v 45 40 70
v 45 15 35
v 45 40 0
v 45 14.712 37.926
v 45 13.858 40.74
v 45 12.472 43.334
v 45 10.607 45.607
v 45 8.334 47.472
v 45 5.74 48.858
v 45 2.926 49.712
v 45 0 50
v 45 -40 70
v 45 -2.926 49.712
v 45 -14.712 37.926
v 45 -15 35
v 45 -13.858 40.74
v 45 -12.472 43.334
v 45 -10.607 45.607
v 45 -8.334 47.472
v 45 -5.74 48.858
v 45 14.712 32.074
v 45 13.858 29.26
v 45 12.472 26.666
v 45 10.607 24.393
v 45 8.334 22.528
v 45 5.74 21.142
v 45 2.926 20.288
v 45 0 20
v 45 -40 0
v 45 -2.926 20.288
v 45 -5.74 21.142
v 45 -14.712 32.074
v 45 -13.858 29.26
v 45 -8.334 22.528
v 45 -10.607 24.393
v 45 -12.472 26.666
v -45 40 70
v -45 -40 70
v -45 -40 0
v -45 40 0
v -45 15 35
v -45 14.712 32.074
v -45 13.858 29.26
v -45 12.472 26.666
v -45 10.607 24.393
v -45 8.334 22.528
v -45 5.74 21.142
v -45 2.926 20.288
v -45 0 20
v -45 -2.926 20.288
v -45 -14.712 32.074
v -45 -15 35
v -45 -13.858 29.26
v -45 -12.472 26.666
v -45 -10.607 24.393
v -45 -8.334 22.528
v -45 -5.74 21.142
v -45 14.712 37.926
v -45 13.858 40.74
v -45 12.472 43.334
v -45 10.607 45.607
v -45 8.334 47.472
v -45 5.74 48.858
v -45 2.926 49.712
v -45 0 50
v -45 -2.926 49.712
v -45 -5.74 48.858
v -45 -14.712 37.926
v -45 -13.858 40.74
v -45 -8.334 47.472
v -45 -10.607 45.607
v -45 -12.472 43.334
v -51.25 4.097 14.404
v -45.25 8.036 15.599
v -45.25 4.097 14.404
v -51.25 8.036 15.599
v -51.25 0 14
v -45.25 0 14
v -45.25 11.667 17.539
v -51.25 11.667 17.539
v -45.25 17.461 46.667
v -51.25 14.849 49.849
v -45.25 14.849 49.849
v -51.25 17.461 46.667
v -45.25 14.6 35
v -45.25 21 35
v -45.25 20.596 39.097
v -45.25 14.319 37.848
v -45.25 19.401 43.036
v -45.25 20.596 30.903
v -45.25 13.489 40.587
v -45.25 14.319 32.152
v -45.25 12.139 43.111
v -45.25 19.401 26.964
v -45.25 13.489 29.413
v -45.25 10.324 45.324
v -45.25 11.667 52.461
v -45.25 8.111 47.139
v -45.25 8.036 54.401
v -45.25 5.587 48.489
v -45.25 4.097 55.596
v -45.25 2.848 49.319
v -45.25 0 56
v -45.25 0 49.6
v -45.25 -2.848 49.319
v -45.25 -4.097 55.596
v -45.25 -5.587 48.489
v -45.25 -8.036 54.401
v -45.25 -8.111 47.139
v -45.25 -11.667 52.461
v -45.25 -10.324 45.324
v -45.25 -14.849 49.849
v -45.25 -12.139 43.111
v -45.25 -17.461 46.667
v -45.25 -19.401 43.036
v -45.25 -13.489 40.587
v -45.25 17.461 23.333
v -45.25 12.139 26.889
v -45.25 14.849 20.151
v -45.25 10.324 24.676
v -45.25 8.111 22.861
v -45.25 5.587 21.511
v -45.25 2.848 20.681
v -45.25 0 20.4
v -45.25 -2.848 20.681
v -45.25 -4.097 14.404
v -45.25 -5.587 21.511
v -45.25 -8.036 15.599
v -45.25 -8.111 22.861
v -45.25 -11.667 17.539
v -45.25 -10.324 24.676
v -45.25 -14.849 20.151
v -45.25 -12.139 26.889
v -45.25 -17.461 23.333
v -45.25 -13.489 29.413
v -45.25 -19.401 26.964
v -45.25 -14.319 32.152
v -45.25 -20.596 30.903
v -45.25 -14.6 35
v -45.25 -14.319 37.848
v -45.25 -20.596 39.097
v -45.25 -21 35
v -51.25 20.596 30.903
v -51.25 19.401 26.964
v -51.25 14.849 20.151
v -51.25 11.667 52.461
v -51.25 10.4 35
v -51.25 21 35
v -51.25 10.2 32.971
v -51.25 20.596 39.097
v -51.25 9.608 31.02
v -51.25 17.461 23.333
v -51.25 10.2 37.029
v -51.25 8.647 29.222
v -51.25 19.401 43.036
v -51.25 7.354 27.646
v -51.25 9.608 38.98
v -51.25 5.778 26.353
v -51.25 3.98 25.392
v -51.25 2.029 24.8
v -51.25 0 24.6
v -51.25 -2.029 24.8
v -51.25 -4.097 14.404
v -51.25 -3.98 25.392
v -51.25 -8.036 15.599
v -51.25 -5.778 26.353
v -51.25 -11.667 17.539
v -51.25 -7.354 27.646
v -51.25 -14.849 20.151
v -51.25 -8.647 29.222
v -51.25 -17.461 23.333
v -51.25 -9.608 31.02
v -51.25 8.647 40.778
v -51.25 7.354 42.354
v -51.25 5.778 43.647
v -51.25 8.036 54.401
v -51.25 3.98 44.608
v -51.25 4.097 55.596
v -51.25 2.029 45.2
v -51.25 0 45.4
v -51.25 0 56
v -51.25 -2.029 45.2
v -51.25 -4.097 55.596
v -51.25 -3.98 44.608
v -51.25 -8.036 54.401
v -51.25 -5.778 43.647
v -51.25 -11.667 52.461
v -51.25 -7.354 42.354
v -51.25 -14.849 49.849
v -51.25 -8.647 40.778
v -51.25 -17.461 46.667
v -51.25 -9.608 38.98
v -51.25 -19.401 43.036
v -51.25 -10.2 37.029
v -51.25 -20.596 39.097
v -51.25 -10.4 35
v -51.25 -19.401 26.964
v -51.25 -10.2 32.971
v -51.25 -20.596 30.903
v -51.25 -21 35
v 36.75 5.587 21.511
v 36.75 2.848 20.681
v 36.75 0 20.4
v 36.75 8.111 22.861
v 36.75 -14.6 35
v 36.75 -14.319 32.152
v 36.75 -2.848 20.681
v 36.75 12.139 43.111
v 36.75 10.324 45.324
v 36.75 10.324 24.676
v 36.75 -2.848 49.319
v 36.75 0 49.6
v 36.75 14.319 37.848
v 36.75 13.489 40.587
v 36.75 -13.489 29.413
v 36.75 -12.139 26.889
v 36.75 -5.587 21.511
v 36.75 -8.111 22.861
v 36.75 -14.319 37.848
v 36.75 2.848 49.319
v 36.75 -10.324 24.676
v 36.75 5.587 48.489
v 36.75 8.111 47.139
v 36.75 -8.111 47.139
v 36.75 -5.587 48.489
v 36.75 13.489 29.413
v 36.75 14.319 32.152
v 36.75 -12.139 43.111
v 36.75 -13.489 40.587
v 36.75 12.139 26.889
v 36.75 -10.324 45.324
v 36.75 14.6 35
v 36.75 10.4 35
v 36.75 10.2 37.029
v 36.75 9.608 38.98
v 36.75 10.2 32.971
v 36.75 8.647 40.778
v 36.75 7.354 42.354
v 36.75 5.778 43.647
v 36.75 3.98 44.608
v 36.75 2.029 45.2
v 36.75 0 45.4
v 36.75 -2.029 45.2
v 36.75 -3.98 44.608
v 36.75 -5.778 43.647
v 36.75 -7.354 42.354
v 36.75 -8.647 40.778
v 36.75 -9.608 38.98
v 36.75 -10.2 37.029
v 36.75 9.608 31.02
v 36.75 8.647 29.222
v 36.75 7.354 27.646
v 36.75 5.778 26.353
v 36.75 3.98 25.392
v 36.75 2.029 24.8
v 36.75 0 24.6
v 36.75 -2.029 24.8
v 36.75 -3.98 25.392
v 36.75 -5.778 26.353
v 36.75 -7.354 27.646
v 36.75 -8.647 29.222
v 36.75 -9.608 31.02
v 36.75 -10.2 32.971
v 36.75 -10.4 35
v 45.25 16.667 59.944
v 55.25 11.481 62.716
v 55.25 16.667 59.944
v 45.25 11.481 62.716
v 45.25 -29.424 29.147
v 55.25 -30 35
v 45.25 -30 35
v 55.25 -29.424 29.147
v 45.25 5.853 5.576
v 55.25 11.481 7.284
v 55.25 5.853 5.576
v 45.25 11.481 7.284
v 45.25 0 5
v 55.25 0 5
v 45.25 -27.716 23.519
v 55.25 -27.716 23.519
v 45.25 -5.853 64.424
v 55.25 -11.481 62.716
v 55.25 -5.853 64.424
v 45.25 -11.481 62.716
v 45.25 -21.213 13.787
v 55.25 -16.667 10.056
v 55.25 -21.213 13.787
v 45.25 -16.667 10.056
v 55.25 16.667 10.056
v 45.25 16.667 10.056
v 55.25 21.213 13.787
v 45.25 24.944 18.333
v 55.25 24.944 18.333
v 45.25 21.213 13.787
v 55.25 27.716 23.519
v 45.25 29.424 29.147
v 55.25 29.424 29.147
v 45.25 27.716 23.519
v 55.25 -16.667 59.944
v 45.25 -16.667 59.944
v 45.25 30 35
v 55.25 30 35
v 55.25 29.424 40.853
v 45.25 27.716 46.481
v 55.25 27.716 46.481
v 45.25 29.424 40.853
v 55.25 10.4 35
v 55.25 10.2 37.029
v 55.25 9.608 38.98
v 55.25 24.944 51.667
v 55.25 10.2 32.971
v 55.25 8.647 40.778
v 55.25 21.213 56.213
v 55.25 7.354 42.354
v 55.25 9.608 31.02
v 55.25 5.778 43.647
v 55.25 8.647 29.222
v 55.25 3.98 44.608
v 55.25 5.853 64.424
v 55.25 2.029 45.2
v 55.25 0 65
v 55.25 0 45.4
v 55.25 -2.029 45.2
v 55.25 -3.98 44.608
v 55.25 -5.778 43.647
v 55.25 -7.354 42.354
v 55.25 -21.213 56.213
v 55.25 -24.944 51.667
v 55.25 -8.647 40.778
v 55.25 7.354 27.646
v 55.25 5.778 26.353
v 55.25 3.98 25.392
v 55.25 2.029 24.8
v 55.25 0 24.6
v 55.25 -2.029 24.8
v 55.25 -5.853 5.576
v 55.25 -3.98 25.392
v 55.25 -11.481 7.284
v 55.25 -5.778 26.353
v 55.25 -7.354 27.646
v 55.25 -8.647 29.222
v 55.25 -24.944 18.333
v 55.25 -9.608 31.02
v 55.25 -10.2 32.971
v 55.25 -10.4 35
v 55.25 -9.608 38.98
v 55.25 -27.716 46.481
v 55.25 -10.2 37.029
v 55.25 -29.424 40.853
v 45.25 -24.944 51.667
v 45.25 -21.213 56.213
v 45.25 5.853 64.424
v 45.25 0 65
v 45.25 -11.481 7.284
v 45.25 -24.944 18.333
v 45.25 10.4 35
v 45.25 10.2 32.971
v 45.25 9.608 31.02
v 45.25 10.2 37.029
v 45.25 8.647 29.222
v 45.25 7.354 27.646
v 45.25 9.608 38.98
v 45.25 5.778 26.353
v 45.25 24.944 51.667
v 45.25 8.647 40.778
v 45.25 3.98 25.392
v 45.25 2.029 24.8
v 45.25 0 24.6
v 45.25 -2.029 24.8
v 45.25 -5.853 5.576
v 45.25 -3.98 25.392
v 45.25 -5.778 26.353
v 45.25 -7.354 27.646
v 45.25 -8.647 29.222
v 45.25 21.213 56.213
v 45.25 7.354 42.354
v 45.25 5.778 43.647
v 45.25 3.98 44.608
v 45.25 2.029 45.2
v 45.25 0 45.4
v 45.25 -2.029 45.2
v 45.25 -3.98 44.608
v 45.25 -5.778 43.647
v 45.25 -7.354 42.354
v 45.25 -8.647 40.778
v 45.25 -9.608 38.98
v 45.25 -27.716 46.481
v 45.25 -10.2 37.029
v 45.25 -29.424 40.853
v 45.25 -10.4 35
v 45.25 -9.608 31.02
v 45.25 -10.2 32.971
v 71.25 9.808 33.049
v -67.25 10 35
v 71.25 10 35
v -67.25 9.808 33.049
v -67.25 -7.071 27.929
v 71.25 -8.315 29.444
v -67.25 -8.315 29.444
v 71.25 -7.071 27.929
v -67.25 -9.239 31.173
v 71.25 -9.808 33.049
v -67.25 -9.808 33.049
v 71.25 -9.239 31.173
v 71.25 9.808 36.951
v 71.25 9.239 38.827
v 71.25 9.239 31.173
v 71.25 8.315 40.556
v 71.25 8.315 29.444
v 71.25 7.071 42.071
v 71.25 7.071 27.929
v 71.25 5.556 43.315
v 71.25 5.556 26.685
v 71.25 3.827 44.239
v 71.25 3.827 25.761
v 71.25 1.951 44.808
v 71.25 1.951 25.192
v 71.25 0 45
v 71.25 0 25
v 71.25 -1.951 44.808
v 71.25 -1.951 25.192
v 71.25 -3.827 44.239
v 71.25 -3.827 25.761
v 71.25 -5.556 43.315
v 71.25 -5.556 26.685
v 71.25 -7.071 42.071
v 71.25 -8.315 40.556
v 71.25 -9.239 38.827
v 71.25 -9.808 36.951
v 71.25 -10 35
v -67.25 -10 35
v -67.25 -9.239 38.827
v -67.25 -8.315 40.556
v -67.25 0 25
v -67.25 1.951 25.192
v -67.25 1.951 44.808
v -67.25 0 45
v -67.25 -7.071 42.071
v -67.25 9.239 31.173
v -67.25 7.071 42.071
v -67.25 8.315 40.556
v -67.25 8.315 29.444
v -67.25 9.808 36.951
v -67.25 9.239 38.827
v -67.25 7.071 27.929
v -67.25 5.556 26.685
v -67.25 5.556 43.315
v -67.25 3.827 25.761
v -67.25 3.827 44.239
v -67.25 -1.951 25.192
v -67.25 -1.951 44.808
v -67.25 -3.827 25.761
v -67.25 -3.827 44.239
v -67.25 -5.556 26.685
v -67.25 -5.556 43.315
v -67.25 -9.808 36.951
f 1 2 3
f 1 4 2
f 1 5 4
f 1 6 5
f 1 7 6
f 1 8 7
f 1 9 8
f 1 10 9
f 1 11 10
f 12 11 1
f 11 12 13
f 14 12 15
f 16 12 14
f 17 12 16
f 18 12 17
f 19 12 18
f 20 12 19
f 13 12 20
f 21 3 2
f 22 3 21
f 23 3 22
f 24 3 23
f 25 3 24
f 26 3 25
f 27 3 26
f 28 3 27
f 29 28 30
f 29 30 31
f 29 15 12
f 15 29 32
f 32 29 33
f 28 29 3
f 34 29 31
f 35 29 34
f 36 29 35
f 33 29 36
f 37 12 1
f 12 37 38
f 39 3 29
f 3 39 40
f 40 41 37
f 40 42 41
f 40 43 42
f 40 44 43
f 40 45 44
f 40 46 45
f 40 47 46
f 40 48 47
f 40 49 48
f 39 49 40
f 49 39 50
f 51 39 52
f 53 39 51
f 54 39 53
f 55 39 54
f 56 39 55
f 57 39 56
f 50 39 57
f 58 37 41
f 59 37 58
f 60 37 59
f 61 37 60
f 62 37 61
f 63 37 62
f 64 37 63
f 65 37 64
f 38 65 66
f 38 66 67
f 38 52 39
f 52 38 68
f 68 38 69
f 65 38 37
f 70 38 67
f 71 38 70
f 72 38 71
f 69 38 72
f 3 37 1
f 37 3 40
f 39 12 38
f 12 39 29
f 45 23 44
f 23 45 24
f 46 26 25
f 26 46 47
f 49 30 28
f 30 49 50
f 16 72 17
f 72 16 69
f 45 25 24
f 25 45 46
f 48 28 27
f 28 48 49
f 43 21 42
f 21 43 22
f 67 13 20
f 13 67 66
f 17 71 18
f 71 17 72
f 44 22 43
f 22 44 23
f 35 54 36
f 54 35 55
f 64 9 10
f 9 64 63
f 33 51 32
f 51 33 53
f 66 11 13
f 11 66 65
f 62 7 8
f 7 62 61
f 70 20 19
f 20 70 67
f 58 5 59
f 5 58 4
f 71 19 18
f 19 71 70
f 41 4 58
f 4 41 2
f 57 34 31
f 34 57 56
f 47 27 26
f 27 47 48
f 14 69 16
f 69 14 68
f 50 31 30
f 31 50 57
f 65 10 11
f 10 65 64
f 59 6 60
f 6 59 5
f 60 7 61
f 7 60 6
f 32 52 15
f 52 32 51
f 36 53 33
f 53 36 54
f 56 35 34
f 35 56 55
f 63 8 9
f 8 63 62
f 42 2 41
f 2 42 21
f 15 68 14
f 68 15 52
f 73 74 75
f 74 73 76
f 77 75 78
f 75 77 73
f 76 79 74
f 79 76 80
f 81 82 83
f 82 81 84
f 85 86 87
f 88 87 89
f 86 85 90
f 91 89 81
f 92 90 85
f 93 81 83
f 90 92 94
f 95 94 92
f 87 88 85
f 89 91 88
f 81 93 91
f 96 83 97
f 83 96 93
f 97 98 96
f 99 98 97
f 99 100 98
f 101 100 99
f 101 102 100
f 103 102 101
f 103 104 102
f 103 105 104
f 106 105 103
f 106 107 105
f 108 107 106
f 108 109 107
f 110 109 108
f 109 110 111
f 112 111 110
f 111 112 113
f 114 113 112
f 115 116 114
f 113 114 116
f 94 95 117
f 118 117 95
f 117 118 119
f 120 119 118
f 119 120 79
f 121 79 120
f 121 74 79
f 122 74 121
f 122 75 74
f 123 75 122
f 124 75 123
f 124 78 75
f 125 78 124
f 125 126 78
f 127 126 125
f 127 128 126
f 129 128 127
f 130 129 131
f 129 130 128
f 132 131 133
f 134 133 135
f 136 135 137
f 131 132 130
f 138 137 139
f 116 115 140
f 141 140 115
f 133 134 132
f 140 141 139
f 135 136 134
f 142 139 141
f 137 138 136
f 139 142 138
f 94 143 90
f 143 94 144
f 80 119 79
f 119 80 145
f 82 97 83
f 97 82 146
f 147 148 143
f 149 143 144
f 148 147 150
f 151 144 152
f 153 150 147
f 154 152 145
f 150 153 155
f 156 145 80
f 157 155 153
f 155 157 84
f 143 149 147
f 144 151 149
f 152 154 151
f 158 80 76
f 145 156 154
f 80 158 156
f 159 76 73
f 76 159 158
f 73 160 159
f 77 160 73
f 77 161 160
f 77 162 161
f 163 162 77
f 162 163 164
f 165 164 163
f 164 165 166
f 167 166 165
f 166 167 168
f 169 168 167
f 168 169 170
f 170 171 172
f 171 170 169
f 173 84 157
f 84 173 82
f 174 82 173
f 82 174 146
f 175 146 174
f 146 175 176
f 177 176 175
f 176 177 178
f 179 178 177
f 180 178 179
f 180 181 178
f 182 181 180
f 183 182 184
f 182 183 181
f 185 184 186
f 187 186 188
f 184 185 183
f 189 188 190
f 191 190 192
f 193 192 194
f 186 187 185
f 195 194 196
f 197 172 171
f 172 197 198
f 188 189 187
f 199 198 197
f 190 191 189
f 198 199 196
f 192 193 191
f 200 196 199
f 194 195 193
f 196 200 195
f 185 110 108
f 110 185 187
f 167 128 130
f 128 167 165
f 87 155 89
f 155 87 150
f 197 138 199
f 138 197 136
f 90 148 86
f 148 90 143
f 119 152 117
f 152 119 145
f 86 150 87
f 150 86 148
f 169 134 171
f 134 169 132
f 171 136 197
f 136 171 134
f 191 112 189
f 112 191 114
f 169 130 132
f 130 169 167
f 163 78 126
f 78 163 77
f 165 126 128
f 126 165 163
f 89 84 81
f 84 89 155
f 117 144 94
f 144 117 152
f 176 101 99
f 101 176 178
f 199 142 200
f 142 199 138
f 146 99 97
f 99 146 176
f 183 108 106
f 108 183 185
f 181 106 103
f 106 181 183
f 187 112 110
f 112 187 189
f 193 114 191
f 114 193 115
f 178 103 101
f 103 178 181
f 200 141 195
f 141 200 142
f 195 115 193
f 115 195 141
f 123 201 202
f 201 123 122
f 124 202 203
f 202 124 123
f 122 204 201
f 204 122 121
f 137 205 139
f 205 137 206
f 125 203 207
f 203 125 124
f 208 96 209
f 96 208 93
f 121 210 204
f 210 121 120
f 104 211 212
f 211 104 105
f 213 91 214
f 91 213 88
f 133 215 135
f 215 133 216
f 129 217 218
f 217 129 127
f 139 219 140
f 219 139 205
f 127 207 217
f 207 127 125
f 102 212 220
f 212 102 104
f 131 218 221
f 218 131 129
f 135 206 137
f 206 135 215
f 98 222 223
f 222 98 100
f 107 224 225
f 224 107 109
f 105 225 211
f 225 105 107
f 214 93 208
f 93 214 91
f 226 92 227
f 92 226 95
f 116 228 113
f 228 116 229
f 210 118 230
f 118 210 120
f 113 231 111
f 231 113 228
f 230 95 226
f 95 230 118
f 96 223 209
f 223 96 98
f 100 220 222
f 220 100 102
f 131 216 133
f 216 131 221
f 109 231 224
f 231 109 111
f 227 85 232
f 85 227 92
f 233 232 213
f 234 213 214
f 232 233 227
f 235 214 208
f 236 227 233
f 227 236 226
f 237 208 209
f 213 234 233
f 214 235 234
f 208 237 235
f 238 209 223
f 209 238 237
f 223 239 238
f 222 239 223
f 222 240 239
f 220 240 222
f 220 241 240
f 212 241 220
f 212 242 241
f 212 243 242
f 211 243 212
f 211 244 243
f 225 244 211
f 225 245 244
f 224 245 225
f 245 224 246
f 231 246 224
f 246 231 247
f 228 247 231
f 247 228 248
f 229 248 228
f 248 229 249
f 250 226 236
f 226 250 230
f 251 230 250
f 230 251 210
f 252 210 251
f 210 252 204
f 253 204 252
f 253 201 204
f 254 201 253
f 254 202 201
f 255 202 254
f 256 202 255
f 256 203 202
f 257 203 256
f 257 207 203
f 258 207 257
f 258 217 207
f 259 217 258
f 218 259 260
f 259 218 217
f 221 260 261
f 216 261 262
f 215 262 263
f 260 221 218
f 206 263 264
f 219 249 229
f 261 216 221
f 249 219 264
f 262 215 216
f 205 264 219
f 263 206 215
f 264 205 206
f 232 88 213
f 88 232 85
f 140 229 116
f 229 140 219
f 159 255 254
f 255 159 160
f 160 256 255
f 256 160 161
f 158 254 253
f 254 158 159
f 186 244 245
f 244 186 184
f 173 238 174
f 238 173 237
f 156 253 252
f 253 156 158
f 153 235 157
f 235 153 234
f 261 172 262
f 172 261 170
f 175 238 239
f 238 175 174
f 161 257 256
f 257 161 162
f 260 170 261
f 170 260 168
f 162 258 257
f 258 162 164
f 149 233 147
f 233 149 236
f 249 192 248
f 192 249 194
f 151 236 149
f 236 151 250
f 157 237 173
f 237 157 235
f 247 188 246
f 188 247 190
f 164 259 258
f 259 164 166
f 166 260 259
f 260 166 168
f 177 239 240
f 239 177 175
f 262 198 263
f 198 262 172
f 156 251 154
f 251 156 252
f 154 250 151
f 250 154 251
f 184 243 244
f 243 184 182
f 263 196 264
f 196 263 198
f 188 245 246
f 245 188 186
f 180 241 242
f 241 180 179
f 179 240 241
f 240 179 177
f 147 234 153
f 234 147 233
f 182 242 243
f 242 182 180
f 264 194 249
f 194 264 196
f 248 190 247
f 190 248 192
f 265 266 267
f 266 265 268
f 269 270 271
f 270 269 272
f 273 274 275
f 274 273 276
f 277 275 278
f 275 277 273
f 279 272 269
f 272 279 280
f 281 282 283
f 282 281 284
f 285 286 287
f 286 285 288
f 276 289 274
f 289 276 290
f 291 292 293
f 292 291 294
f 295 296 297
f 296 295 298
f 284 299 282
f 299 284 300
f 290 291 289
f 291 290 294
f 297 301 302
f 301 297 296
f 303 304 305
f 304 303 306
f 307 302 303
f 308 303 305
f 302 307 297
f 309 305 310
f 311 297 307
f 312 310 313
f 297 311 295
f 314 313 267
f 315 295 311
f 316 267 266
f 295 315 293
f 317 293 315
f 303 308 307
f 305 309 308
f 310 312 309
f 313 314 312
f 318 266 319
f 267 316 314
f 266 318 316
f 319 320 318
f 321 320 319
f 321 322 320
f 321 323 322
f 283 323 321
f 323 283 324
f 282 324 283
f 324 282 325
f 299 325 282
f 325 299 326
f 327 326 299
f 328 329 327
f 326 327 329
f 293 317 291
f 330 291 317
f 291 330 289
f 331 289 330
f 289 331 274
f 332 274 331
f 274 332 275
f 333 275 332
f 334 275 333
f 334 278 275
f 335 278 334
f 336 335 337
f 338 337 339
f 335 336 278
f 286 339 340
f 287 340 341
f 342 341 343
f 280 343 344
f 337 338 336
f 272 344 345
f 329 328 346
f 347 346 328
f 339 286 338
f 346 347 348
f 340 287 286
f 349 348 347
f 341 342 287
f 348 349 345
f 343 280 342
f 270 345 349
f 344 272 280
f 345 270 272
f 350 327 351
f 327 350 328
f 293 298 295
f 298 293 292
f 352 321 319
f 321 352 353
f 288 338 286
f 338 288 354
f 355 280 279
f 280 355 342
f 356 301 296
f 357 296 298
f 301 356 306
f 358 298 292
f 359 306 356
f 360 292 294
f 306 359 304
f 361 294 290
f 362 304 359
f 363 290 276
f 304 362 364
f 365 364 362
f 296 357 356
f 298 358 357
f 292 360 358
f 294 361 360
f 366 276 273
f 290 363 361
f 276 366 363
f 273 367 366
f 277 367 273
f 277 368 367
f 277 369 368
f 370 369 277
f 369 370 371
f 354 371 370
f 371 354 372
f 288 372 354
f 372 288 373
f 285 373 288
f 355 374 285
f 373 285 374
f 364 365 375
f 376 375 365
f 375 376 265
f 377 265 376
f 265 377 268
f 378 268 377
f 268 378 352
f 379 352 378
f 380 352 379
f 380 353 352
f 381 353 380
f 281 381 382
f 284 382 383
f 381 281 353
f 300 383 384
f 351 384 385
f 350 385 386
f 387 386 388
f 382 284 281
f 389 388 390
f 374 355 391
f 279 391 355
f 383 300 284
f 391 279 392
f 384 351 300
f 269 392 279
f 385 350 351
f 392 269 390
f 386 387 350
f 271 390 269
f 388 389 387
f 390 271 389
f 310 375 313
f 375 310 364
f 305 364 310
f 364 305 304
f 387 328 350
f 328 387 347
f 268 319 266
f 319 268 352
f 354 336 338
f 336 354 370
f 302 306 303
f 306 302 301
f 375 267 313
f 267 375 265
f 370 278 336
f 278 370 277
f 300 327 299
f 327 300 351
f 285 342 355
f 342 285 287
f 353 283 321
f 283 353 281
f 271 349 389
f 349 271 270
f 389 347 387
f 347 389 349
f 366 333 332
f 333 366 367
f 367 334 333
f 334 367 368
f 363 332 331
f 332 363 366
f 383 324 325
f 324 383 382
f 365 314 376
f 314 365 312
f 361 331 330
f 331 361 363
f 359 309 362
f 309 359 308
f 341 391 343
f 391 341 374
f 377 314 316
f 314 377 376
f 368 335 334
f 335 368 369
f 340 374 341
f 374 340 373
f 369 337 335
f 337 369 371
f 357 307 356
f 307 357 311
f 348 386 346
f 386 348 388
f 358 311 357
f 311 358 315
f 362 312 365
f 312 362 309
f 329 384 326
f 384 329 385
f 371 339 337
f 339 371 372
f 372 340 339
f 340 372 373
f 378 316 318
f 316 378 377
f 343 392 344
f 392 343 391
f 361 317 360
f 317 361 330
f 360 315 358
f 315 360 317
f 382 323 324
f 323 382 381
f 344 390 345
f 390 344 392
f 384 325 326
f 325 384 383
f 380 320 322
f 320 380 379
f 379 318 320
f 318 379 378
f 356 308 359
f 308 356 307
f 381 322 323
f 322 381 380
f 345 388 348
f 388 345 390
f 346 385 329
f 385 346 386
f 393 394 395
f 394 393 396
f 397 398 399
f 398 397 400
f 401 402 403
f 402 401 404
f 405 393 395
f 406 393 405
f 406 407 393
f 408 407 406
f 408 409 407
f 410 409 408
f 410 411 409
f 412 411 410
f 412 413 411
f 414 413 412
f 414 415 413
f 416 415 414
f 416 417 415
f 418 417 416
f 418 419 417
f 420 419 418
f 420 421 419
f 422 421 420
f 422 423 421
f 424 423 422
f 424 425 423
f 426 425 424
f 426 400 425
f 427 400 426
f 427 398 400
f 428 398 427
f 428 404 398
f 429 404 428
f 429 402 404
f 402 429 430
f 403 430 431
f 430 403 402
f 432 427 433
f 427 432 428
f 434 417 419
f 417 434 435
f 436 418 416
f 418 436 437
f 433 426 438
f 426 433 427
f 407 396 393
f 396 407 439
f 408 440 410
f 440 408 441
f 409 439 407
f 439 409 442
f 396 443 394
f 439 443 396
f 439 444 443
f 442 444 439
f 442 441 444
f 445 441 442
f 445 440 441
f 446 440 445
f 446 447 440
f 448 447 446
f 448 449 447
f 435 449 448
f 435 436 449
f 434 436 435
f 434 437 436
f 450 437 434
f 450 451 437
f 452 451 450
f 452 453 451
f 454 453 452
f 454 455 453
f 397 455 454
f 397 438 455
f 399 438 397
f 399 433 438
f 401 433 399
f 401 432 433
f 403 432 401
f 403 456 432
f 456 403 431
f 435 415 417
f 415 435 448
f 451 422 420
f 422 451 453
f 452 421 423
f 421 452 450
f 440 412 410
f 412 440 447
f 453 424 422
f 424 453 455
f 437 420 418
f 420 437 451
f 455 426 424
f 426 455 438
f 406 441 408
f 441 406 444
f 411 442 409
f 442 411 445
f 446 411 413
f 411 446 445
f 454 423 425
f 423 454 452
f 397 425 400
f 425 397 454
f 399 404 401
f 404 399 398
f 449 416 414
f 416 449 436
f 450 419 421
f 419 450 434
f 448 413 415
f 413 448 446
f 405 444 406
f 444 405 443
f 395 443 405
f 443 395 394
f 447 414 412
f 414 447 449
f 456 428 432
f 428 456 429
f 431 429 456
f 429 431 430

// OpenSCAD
$fn = 32;

// ------------------------------------------------------------------------
// Bushed housing: 90 x 80 x 70 mm housing, bushing d29.2
// Every part is its own module, assembly() places them once.
// ------------------------------------------------------------------------

// --- part 1 ---
module housing() {
  difference() {
    translate([-45, -40, 0]) cube([90, 80, 70]);
    translate([0, 0, 35]) rotate([0, 90, 0]) cylinder(h = 92, d = 30, center = true);
  }
}

// --- part 2 ---
module bushing() {
  difference() {
    union() {
      cylinder(h = 6, d = 42);
      translate([0, 0, 6]) cylinder(h = 82, d = 29.2);
    }
    translate([0, 0, -1]) cylinder(h = 90, d = 20.8);
  }
}

// --- part 3 ---
module shaft() {
  translate([0, 0, -69.25]) cylinder(h = 138.5, d = 20);
}

// --- part 4 ---
module cover() {
  difference() {
    cylinder(h = 10, d = 60);
    translate([0, 0, -1]) cylinder(h = 12, d = 20.8);
  }
}

// --- assembly ---
module assembly() {
  translate([0, 0, 0]) rotate([0, 0, 0]) housing();
  translate([-51.25, 0, 35]) rotate([0, 90, 0]) bushing();
  translate([2, 0, 35]) rotate([0, 90, 0]) shaft();
  translate([45.25, 0, 35]) rotate([0, 90, 0]) cover();
}

assembly();
